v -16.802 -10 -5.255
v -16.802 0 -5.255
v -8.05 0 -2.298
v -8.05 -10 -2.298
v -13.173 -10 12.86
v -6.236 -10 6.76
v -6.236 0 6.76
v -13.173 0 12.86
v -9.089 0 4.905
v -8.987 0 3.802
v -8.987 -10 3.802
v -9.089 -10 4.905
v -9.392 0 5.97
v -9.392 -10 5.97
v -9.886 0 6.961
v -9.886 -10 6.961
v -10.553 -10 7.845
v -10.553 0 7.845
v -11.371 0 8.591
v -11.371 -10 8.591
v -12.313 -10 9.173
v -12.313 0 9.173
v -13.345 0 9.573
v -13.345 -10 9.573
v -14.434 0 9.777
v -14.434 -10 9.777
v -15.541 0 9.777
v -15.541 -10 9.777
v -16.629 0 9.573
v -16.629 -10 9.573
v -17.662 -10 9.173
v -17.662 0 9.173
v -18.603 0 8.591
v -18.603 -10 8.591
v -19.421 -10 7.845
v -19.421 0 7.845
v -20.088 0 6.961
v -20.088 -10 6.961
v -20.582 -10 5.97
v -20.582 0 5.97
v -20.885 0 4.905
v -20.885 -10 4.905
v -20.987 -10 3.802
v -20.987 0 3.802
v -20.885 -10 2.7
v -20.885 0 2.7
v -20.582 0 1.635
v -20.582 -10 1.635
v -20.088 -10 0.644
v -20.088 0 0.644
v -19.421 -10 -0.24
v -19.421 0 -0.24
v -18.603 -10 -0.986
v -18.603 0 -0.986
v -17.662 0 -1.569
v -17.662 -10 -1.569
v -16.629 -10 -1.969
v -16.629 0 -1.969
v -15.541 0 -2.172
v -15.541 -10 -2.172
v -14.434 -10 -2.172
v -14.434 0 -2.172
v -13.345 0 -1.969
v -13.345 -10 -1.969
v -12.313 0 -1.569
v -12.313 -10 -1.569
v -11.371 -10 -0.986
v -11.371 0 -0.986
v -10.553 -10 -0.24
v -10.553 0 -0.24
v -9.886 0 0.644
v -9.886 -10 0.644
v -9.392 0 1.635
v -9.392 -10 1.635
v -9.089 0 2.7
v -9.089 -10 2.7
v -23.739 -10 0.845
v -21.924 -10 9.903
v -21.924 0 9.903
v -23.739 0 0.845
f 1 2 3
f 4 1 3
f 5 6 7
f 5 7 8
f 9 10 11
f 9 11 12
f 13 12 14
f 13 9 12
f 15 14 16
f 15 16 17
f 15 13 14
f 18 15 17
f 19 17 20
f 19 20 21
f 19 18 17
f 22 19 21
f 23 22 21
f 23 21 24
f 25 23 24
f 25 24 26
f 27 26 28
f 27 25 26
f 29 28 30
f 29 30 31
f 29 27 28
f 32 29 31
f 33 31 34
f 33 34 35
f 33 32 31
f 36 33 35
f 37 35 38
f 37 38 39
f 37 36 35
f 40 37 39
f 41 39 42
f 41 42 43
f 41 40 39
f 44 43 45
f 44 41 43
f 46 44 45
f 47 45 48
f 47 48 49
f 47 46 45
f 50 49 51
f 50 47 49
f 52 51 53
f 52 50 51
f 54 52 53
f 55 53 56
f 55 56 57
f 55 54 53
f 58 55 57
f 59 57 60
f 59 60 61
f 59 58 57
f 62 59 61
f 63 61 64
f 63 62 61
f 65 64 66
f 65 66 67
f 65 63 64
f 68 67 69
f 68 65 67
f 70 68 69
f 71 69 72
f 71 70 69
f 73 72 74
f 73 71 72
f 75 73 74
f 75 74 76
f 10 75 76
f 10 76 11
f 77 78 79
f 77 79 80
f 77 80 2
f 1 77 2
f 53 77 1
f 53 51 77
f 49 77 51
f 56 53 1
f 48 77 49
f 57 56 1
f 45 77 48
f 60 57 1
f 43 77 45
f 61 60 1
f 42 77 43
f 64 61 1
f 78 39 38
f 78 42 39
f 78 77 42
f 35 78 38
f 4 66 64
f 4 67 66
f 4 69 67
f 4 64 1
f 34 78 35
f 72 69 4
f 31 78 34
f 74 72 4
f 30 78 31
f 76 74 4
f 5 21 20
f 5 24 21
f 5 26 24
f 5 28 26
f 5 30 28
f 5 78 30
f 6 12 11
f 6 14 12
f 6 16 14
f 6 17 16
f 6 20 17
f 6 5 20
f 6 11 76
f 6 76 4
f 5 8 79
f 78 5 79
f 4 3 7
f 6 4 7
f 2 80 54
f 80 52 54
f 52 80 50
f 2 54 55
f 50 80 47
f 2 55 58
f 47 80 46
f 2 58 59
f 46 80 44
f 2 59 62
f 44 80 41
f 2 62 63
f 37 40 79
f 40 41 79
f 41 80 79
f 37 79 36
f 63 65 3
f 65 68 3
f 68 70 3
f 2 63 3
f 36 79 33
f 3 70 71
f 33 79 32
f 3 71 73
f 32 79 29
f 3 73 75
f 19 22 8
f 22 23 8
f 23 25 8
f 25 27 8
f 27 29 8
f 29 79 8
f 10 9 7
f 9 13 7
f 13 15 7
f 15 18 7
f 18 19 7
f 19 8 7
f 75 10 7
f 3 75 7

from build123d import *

# Parameters (mm, degrees)
F0_R     = 6
F1_DEPTH = 10


# Not quite as in the source:
# - the program builds the solid bodies; features that only make, move or delete a surface that nothing else refers to are left out


with BuildPart() as f1:
    # F0 (on Front) → F1 (new body)
    with BuildSketch(Plane.XZ):
        Polygon((-16.8017068945, -5.2552340917), (-8.0502918376, -2.2978589318), (-6.2357463262, 6.7597764064), (-13.1726158716, 12.8600365847), (-21.9240309284, 9.9026614248), (-23.7385764399, 0.8450260866), align=None)
        with Locations((-14.987161383, 3.8024012465)):
            Circle(F0_R, mode=Mode.SUBTRACT)
    extrude(amount=F1_DEPTH)


solid = f1.part
